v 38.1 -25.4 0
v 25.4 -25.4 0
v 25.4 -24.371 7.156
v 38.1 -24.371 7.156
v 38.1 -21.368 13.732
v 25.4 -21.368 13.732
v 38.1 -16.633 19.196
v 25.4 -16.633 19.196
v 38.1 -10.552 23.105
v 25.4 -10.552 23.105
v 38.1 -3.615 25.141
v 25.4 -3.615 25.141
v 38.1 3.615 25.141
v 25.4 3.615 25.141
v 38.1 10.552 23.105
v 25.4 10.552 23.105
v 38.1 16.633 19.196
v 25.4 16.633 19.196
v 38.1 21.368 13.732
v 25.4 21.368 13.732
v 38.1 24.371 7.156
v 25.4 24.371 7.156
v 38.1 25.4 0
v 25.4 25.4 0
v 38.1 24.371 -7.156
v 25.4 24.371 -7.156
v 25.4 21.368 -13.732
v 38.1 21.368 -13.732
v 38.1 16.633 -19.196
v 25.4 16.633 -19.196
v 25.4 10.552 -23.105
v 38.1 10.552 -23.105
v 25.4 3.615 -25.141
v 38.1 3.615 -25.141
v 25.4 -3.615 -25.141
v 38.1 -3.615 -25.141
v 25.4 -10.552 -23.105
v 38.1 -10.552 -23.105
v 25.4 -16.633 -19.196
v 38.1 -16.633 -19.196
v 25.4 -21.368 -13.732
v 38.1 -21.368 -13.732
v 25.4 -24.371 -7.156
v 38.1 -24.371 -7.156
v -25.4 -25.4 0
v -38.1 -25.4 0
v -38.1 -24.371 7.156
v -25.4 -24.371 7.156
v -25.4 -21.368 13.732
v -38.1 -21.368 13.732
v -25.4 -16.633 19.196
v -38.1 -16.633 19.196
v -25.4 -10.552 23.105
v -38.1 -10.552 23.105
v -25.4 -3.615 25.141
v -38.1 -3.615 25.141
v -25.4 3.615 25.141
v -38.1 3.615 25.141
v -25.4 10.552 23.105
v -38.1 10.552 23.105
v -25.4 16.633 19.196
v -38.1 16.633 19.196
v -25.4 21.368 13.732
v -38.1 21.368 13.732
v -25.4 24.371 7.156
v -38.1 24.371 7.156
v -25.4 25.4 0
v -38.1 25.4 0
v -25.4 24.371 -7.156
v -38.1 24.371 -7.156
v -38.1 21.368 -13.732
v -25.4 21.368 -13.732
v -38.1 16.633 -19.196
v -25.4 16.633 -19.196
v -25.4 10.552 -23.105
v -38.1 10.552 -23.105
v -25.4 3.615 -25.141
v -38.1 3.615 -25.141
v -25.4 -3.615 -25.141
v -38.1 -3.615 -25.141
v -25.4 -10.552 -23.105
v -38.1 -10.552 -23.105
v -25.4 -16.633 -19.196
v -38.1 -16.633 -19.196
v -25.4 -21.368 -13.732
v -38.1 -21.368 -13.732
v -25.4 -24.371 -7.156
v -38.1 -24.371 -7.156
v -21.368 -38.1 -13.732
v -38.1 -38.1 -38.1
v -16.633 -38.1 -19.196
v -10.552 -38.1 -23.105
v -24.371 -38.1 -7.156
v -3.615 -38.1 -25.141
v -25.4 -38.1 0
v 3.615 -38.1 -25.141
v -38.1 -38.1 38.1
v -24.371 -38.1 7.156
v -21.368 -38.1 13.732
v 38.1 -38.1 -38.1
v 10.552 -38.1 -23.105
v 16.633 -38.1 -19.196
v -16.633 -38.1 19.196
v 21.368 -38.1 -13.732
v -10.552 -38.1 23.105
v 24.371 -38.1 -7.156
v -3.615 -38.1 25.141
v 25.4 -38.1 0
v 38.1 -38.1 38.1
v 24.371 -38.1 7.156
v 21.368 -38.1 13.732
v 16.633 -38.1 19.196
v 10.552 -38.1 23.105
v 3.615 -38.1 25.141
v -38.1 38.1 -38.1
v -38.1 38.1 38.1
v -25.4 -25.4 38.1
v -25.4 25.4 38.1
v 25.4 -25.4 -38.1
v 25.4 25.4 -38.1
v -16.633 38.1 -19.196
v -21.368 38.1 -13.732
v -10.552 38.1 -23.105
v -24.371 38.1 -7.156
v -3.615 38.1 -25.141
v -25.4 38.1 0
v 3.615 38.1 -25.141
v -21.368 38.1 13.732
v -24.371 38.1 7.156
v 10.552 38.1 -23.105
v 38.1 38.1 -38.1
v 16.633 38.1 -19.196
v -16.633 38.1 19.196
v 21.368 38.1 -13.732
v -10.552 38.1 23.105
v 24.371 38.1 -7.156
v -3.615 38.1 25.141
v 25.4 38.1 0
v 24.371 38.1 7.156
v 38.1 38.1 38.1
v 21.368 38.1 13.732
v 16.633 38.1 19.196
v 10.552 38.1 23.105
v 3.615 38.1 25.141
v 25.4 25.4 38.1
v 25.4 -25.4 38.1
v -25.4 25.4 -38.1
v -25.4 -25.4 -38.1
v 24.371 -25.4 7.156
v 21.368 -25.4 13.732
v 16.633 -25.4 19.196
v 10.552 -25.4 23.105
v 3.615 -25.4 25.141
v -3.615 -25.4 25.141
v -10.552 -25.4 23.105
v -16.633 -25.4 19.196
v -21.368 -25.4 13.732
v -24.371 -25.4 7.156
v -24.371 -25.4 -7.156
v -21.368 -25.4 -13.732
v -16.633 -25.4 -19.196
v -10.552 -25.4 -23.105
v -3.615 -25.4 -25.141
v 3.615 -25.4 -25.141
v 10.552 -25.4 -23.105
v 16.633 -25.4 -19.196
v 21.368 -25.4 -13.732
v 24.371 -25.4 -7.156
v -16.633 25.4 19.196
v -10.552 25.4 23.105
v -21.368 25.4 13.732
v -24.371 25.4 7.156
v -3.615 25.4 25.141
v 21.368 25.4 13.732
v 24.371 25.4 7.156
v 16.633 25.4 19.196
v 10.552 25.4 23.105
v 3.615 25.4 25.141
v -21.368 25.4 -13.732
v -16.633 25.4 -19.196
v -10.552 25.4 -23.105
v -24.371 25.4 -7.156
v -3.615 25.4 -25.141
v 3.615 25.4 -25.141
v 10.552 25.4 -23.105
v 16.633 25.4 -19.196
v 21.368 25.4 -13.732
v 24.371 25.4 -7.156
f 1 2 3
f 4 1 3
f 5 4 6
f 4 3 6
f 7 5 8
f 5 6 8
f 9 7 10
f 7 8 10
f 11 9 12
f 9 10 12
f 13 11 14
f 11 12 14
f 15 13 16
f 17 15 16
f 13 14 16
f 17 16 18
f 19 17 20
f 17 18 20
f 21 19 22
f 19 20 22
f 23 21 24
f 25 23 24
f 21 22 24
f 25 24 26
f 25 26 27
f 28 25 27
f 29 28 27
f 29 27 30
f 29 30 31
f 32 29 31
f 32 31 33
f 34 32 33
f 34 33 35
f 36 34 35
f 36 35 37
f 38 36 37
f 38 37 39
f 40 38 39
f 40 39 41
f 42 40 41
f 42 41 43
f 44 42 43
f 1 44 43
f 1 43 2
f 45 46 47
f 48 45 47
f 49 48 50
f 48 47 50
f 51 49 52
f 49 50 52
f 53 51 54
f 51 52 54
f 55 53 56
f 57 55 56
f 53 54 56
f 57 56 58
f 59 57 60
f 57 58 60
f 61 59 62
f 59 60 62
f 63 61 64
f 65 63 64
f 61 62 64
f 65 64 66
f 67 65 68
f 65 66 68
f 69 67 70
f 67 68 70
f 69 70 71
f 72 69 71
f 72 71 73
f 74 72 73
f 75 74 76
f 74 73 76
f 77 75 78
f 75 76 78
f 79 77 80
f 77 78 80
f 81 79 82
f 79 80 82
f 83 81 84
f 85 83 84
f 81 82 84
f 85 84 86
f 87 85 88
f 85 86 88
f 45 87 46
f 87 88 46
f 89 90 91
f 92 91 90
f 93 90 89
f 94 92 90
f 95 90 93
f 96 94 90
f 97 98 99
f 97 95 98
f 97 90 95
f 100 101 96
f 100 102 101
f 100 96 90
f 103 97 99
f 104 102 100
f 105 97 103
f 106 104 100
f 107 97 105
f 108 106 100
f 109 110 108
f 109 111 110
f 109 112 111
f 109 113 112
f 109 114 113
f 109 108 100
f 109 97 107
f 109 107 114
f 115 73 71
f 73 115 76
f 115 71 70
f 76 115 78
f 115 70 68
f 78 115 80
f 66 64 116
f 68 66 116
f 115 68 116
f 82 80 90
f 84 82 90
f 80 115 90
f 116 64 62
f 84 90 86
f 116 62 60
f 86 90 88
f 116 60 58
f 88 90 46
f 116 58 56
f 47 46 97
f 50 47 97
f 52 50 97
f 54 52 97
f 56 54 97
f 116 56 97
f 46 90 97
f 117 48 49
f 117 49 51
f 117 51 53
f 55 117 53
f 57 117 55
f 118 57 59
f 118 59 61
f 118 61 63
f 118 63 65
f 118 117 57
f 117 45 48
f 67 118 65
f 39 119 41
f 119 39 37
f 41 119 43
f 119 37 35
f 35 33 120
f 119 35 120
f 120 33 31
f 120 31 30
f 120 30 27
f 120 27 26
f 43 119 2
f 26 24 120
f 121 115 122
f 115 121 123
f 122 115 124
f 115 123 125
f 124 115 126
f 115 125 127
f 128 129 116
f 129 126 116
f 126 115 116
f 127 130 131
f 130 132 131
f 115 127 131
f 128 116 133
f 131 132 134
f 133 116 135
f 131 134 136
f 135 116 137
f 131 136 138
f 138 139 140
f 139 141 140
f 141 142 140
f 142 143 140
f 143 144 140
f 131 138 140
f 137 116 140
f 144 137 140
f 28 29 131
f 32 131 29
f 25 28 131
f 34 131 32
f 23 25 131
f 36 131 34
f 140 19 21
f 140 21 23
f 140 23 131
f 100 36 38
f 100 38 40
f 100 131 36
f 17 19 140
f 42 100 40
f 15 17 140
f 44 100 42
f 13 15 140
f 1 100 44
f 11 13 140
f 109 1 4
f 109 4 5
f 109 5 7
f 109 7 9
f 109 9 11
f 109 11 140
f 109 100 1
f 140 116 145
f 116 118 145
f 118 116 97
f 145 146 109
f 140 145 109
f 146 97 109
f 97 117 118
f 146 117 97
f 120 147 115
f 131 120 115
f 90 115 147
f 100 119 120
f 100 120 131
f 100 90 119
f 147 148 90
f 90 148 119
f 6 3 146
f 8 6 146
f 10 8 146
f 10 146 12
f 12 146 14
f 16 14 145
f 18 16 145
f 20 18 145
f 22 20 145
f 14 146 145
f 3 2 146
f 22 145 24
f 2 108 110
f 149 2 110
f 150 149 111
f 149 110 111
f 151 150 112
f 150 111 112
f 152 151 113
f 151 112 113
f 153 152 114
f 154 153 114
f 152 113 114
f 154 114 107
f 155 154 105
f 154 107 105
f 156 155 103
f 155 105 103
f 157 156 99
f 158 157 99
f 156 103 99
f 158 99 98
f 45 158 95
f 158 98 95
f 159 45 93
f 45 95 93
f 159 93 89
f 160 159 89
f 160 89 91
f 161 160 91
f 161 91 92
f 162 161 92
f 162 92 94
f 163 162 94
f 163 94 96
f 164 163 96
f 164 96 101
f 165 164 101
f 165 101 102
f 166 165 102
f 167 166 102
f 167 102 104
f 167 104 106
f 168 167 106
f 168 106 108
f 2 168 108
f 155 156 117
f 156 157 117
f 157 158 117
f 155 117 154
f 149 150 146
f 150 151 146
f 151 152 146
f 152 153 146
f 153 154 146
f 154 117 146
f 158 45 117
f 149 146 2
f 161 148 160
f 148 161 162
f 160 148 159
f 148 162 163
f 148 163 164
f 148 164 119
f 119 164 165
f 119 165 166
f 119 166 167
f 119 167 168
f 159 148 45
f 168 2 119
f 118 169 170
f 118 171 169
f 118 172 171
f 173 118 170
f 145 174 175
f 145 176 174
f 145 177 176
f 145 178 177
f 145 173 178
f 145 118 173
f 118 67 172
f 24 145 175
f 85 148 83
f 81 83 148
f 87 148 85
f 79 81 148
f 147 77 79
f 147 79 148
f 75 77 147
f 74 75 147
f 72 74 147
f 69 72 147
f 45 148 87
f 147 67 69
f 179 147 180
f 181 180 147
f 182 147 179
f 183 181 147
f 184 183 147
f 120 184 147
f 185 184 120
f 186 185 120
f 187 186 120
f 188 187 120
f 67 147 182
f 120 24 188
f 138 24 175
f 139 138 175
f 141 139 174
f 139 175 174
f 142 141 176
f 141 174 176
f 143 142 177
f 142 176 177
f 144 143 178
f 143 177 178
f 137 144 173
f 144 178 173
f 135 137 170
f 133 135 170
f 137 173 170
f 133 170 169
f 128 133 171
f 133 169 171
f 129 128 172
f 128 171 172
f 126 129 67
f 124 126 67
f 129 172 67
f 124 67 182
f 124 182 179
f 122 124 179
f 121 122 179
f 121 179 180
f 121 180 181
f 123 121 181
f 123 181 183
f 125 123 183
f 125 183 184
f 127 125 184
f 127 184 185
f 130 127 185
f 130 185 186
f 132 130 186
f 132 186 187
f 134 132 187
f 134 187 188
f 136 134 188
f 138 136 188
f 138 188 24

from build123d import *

# Parameters (mm, degrees)
F0_W     = 76.2
F0_H     = 76.2
F1_DEPTH = 38.1
F2_R     = 25.4
F3_DEPTH = 76.2
F4_R     = 25.4
F5_DEPTH = 76.2
F6_W     = 50.8
F6_H     = 50.8
F7_DEPTH = 76.2


with BuildPart() as f1:
    # F0 (on Front) → F1 (new body, symmetric)
    with BuildSketch(Plane.XZ):
        Rectangle(F0_W, F0_H)
    extrude(amount=F1_DEPTH, both=True)

    # F2 (on face) → F3 (cut, through all)
    with BuildSketch(Plane(origin=(-38.1, 0, 0), x_dir=(0, -1, 0), z_dir=(-1, 0, 0))):
        Circle(F2_R)
    extrude(amount=-F3_DEPTH, mode=Mode.SUBTRACT)

    # F4 (on face) → F5 (cut)
    with BuildSketch(Plane.XZ.offset(38.1)):
        Circle(F4_R)
    extrude(amount=-F5_DEPTH, mode=Mode.SUBTRACT)

    # F6 (on face) → F7 (cut)
    with BuildSketch(Plane.XY.offset(38.1)):
        Rectangle(F6_W, F6_H)
    extrude(amount=-F7_DEPTH, mode=Mode.SUBTRACT)


solid = f1.part
